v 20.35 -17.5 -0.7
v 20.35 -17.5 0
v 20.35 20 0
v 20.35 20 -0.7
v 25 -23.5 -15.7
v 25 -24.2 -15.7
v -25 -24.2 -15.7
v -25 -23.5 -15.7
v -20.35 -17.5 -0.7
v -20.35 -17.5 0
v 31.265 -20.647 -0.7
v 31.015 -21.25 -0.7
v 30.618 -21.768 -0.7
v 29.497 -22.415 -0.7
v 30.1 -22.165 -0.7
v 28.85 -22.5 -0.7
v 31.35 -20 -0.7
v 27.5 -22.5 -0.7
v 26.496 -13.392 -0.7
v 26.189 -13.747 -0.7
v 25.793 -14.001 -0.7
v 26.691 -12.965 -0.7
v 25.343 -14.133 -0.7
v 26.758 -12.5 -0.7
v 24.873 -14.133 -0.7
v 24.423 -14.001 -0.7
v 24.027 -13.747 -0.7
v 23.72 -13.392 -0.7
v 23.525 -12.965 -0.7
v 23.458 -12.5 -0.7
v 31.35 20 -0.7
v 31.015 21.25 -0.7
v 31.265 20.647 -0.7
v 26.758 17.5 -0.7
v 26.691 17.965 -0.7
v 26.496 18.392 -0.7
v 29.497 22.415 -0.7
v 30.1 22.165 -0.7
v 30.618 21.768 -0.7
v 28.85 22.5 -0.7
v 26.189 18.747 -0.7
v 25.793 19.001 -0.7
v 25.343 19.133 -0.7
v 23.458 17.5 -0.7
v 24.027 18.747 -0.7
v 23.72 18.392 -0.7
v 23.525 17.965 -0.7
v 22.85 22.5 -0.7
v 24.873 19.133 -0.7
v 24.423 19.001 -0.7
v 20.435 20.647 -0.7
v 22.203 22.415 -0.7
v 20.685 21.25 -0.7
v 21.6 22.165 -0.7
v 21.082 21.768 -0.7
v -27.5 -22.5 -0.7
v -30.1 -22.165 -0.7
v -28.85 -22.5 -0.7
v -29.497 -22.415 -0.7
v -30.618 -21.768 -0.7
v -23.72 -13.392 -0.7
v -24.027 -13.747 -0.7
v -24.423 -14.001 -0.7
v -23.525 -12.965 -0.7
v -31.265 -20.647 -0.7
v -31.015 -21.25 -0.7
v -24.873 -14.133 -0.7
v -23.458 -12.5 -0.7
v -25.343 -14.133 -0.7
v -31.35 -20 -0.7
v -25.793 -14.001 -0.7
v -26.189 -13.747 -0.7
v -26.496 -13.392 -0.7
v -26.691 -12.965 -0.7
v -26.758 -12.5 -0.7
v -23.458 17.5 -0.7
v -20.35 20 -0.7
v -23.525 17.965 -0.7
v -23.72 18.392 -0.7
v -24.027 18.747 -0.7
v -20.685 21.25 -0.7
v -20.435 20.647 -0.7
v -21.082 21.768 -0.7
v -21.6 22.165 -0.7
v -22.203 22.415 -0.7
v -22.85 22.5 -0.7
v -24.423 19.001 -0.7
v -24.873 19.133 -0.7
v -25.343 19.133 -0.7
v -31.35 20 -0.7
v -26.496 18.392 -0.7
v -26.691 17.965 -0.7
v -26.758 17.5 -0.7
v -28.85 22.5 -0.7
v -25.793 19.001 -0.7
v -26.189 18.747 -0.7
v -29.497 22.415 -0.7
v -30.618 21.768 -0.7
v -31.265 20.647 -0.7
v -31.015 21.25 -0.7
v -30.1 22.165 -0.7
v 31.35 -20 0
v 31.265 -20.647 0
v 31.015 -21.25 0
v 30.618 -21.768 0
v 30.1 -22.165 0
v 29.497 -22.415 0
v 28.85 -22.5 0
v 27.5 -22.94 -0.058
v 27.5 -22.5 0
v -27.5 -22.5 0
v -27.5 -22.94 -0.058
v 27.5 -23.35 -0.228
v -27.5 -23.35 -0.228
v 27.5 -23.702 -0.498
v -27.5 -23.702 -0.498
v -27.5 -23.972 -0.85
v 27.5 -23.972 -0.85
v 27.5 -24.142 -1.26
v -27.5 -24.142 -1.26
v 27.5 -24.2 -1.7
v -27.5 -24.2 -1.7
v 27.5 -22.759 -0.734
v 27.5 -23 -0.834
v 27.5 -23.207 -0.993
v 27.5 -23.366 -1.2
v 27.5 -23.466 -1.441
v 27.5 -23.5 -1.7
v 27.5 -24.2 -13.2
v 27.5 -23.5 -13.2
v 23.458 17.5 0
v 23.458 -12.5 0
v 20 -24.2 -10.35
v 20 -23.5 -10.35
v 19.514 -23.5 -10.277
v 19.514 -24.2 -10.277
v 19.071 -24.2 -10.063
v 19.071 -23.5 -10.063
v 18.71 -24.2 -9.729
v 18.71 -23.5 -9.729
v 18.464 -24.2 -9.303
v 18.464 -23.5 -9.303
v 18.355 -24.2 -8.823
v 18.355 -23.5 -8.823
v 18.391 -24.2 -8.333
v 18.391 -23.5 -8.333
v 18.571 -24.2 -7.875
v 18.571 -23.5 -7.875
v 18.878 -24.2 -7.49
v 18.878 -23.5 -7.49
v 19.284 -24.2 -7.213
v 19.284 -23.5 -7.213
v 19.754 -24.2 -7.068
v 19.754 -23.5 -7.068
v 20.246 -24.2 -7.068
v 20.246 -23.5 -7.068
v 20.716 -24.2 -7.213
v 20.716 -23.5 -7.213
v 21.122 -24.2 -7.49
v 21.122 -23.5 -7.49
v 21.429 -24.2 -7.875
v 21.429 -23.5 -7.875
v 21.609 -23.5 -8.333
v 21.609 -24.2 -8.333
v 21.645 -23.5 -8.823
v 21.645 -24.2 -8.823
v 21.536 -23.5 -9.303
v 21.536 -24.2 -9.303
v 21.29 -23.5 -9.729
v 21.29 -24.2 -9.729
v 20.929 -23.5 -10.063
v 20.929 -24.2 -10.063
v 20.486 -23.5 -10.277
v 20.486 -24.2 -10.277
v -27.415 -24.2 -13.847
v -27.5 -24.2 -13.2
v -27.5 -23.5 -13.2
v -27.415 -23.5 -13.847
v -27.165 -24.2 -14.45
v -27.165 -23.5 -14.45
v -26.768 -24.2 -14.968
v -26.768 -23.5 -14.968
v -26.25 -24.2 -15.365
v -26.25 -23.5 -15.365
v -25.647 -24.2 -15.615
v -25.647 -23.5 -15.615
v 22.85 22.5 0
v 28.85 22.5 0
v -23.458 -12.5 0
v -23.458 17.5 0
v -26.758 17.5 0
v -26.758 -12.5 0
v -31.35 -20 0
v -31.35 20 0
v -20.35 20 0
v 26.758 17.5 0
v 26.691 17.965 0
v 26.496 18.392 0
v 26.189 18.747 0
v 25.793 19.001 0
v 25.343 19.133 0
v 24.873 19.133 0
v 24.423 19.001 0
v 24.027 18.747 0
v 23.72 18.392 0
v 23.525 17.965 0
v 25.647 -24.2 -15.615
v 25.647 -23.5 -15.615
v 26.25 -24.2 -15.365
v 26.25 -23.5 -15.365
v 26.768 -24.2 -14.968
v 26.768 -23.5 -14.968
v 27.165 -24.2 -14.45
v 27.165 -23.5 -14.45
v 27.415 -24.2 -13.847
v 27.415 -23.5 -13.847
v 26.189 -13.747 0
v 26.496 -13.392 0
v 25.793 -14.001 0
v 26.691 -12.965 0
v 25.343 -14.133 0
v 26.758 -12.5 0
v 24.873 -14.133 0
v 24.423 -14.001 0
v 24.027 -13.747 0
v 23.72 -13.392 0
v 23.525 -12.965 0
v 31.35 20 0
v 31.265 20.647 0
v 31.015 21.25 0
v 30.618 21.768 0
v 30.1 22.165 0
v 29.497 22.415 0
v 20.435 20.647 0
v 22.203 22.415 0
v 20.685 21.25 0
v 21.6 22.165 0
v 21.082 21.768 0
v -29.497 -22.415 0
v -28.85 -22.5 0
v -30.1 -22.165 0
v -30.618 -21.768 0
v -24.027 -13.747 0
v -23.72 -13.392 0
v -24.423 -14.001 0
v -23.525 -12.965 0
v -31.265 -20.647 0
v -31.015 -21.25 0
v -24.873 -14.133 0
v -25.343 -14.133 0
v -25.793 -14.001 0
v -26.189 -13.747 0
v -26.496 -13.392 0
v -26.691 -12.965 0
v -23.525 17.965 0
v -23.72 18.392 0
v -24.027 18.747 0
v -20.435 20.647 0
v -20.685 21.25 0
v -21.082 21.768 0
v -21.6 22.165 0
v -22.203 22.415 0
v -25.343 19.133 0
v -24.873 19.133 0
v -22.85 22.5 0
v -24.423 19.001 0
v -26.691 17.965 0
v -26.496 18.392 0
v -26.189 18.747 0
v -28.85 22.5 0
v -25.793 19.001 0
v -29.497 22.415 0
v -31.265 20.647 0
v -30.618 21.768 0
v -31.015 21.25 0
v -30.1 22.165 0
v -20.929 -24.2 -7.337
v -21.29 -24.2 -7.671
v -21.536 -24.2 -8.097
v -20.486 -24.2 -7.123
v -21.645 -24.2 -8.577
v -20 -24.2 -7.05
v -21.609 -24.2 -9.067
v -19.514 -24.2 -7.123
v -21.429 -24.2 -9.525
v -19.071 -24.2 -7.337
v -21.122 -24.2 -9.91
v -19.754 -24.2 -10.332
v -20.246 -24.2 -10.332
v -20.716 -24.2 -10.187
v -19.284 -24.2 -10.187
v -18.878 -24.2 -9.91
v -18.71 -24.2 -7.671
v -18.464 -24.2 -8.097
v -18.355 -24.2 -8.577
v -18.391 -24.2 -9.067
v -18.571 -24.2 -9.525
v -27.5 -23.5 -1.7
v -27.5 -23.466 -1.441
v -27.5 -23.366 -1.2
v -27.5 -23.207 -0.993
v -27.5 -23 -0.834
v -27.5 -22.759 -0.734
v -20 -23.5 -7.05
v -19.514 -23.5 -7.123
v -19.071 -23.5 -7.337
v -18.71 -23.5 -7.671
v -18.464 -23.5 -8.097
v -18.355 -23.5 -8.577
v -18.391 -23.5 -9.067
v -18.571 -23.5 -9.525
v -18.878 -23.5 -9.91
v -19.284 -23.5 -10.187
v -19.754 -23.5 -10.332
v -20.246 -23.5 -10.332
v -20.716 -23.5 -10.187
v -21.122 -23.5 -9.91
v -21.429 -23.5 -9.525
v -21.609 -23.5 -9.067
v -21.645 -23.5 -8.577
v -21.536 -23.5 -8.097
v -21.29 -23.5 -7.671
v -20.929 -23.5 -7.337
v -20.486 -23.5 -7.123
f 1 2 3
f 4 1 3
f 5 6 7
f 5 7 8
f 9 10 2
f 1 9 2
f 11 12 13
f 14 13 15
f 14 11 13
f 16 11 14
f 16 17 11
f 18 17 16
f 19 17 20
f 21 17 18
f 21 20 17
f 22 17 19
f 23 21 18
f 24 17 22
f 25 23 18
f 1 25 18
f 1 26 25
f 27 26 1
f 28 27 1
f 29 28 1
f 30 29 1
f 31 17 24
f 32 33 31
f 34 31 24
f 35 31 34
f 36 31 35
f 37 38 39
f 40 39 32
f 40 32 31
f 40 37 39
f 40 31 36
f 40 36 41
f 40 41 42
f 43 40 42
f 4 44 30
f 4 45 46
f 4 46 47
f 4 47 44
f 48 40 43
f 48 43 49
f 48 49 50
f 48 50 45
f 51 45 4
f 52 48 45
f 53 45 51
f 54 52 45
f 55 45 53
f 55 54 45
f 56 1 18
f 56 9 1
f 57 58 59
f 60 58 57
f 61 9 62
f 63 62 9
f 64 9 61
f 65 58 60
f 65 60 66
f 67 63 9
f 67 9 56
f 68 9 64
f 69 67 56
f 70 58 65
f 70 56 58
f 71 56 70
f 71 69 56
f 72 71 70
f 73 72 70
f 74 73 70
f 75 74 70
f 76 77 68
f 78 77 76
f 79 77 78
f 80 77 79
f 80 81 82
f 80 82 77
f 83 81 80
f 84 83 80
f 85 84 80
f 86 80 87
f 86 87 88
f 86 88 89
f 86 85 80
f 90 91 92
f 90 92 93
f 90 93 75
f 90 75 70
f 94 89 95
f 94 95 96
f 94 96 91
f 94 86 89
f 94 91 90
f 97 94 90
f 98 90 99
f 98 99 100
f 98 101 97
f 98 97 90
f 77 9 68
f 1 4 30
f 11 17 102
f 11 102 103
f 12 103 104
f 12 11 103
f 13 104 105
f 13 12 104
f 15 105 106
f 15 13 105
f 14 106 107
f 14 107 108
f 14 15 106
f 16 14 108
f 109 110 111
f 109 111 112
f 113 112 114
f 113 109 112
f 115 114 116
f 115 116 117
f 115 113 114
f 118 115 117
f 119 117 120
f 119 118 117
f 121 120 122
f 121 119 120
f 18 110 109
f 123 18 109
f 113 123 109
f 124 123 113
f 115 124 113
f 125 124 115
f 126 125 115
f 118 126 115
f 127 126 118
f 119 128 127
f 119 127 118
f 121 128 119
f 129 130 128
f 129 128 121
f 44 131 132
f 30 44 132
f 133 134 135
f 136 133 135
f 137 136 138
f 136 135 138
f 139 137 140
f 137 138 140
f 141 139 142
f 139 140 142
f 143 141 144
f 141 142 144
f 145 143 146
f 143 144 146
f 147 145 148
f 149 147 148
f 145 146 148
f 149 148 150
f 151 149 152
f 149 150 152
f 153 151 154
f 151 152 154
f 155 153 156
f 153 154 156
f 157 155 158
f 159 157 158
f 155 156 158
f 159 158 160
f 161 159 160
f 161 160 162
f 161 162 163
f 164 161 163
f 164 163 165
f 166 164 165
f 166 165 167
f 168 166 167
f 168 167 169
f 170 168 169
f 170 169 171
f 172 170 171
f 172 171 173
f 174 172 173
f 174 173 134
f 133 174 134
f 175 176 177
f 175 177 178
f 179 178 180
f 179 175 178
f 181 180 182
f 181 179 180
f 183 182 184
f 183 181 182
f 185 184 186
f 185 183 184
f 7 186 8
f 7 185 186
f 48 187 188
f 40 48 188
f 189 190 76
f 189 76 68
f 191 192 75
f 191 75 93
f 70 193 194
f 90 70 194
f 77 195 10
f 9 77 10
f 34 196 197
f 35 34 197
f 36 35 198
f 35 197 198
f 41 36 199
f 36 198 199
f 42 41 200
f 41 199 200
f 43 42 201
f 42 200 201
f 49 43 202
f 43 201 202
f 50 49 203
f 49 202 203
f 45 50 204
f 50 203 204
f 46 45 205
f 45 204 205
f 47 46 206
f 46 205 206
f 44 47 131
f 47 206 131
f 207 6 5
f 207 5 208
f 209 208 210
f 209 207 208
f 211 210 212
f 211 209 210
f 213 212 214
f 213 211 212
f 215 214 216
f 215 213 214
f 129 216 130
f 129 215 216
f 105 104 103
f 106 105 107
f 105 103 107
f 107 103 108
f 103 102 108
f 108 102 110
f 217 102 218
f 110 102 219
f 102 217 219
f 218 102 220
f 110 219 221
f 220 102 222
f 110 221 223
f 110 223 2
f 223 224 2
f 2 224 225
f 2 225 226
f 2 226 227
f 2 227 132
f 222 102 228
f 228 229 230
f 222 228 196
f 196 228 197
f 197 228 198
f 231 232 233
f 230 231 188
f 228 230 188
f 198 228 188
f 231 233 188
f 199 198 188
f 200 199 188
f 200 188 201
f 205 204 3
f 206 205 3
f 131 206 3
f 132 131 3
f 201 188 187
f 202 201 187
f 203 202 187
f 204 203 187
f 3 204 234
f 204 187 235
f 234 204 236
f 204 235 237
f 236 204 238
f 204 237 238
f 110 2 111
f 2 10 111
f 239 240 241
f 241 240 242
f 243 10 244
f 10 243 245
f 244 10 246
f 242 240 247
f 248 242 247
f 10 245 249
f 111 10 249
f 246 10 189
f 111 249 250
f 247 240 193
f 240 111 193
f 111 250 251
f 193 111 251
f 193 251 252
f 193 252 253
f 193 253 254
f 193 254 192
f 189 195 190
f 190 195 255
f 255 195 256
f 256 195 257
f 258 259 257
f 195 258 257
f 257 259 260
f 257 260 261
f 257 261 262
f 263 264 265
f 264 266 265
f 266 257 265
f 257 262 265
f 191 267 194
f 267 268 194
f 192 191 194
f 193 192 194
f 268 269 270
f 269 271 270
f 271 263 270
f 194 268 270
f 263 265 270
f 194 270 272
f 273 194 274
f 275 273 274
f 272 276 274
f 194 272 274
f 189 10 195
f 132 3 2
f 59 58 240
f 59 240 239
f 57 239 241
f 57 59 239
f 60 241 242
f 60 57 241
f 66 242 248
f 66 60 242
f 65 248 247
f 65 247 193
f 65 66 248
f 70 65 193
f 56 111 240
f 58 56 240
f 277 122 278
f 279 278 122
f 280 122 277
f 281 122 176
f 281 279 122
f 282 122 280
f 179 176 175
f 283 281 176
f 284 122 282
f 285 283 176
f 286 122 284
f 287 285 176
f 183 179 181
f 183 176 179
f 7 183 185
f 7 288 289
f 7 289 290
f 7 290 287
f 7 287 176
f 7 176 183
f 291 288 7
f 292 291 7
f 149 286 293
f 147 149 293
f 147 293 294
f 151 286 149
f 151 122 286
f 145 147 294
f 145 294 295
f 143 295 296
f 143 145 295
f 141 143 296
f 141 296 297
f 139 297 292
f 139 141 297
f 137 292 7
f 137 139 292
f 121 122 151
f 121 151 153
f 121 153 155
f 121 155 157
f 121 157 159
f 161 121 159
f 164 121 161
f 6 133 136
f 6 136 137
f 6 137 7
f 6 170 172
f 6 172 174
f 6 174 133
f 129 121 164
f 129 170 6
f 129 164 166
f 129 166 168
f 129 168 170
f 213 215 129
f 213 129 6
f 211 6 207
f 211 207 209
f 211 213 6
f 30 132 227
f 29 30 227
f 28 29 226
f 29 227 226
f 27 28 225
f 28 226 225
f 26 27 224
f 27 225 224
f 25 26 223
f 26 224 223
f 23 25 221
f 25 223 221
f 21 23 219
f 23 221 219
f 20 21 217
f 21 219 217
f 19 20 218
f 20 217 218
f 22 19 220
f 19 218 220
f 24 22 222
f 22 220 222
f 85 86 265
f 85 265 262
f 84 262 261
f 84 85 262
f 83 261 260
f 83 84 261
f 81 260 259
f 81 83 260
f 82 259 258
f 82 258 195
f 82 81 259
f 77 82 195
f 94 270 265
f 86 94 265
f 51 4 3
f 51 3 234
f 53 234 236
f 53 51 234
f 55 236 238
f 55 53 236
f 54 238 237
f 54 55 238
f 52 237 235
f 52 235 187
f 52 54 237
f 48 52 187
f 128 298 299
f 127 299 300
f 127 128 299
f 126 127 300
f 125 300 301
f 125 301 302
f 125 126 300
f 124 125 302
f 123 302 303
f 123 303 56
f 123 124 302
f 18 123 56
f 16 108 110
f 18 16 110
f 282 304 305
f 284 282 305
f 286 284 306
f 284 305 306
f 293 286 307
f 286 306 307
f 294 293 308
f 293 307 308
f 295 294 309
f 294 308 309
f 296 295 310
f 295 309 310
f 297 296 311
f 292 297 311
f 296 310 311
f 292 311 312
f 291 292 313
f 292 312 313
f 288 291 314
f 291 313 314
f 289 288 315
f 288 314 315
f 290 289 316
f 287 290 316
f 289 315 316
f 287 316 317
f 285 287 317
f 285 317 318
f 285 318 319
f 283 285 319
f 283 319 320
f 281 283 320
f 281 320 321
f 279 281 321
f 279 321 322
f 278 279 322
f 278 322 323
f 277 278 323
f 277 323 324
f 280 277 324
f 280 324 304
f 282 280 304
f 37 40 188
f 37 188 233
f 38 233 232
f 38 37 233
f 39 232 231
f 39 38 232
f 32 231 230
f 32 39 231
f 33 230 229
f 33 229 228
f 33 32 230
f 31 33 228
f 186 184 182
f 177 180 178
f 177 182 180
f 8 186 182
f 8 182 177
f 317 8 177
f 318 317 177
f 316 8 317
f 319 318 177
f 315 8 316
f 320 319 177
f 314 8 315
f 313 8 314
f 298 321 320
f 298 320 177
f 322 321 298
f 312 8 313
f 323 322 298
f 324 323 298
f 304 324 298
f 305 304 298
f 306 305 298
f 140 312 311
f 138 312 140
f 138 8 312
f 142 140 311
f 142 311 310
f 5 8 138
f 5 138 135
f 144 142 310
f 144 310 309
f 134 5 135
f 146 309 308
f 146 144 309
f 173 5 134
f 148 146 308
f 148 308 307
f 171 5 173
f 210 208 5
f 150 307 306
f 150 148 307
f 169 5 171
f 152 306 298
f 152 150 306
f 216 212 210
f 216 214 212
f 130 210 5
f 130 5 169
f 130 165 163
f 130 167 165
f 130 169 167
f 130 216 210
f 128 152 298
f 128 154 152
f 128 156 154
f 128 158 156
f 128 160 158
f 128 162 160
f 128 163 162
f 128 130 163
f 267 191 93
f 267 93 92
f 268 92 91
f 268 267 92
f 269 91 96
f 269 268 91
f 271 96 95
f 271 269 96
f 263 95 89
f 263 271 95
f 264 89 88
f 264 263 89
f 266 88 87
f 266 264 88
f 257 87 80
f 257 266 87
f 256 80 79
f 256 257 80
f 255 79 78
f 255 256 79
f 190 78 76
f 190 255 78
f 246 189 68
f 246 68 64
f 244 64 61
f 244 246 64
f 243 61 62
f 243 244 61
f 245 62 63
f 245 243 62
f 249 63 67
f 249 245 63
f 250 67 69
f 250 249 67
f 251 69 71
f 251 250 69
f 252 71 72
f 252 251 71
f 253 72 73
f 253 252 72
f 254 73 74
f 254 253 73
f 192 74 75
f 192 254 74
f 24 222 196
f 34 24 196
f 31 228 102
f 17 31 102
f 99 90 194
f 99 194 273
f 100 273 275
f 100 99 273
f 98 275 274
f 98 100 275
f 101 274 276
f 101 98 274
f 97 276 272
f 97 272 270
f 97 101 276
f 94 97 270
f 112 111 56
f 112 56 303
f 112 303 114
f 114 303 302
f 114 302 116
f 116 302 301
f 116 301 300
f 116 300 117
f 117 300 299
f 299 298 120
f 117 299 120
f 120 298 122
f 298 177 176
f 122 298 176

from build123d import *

# Parameters (mm, degrees)
BASE_FLANGE1_DEPTH    = 0.7
EDGE_FLANGE1_DEPTH    = 55
CUT_EXTRUDE1_DEPTH    = 10
CUT_EXTRUDE2_REACH    = 59.839
SKETCH9_R             = 1.65
BREAK_CORNER1_START   = -24.2
BREAK_CORNER1_DEPTH   = 0.7
BREAK_CORNER1_START_2 = -0.7
BREAK_CORNER1_2_DEPTH = 0.7


# Read off the part's stored shape, not the designer's step: Break-Corner1
# Sheet-metal steps are written as plain solids
with BuildPart() as part:
    # Sketch2 → Base-Flange1 (new body)
    with BuildSketch(Plane.XY):
        Polygon((20.35, 22.5), (31.35, 22.5), (31.35, -22.5), (-31.35, -22.5), (-31.35, 22.5), (-20.35, 22.5), (-20.35, -17.5), (20.35, -17.5), align=None)
    extrude(amount=-BASE_FLANGE1_DEPTH)

    # Edge-Flange1 section (across the edge) → Edge-Flange1 (add)
    with BuildSketch(Plane(origin=(27.5, -23.5, -0.7), x_dir=(0, 1, 0), z_dir=(-1, 0, 0))):
        with BuildLine():
            Line((-0.7, 1), (-0.7, 15))
            Line((-0.7, 15), (0, 15))
            Line((0, 15), (0, 1))
            ThreePointArc((0, 1), (0.292893219, 0.292893219), (1, 0))
            Line((1, 0), (1, -0.7))
            ThreePointArc((1, -0.7), (-0.202081528, -0.202081528), (-0.7, 1))
        make_face()
    extrude(amount=EDGE_FLANGE1_DEPTH)

    # Sketch8 → Cut-Extrude1 (cut)
    with BuildSketch(Plane.XY):
        with BuildLine():
            Line((-23.458, 17.5), (-23.458, -12.5))
            ThreePointArc((-23.458, -12.5), (-25.108, -14.15), (-26.758, -12.5))
            Line((-26.758, -12.5), (-26.758, 17.5))
            ThreePointArc((-26.758, 17.5), (-25.108, 19.15), (-23.458, 17.5))
        make_face()
        with BuildLine():
            Line((23.458, 17.5), (23.458, -12.5))
            ThreePointArc((23.458, -12.5), (25.108, -14.15), (26.758, -12.5))
            Line((26.758, -12.5), (26.758, 17.5))
            ThreePointArc((26.758, 17.5), (25.108, 19.15), (23.458, 17.5))
        make_face()
    extrude(amount=-CUT_EXTRUDE1_DEPTH, mode=Mode.SUBTRACT)

    # Sketch9 → Cut-Extrude2 (cut, up to next)
    with BuildSketch(Plane(origin=(0, -23.5, 0), x_dir=(1, 0, 0), z_dir=(0, 1, 0)), mode=Mode.PRIVATE) as cut_extrude2_sk1:
        with Locations(Location((-20, 8.7, 0), (0, 0, 270))):
            Circle(SKETCH9_R)
    cut_extrude2_tool1 = extrude(cut_extrude2_sk1.sketch, amount=-CUT_EXTRUDE2_REACH, mode=Mode.PRIVATE) & part.part
    # Sketch9 → Cut-Extrude2 (cut, up to next)
    with BuildSketch(Plane(origin=(0, -23.5, 0), x_dir=(1, 0, 0), z_dir=(0, 1, 0)), mode=Mode.PRIVATE) as cut_extrude2_sk2:
        with Locations(Location((20, 8.7, 0), (0, 0, 90))):
            Circle(SKETCH9_R)
    cut_extrude2_tool2 = extrude(cut_extrude2_sk2.sketch, amount=-CUT_EXTRUDE2_REACH, mode=Mode.PRIVATE) & part.part
    add(cut_extrude2_tool1.solids().sort_by_distance((-20, -23.5, -8.7))[0], mode=Mode.SUBTRACT)
    add(cut_extrude2_tool2.solids().sort_by_distance((20, -23.5, -8.7))[0], mode=Mode.SUBTRACT)

    # Break-Corner1 outline → Break-Corner1 (cut)
    with BuildSketch(Plane(origin=(0, 0, 0), x_dir=(1, 0, 0), z_dir=(0, 1, 0)).offset(BREAK_CORNER1_START)):
        with BuildLine():
            Line((27.5, 15.7), (25, 15.7))
            ThreePointArc((25, 15.7), (26.767766953, 14.967766953), (27.5, 13.2))
            Line((27.5, 13.2), (27.5, 15.7))
        make_face()
        with BuildLine():
            ThreePointArc((-27.5, 13.2), (-26.767766953, 14.967766953), (-25, 15.7))
            Line((-25, 15.7), (-27.5, 15.7))
            Line((-27.5, 15.7), (-27.5, 13.2))
        make_face()
    extrude(amount=BREAK_CORNER1_DEPTH, mode=Mode.SUBTRACT)

    # Break-Corner1 2 outline → Break-Corner1 2 (cut)
    with BuildSketch(Plane.XY.offset(BREAK_CORNER1_START_2)):
        with BuildLine():
            ThreePointArc((20.35, 20), (21.082233047, 21.767766953), (22.85, 22.5))
            Line((22.85, 22.5), (20.35, 22.5))
            Line((20.35, 22.5), (20.35, 20))
        make_face()
        with BuildLine():
            ThreePointArc((28.85, 22.5), (30.617766953, 21.767766953), (31.35, 20))
            Line((31.35, 20), (31.35, 22.5))
            Line((31.35, 22.5), (28.85, 22.5))
        make_face()
        with BuildLine():
            ThreePointArc((31.35, -20), (30.617766953, -21.767766953), (28.85, -22.5))
            Line((28.85, -22.5), (31.35, -22.5))
            Line((31.35, -22.5), (31.35, -20))
        make_face()
        with BuildLine():
            Line((-20.35, 22.5), (-22.85, 22.5))
            ThreePointArc((-22.85, 22.5), (-21.082233047, 21.767766953), (-20.35, 20))
            Line((-20.35, 20), (-20.35, 22.5))
        make_face()
        with BuildLine():
            Line((-31.35, 22.5), (-31.35, 20))
            ThreePointArc((-31.35, 20), (-30.617766953, 21.767766953), (-28.85, 22.5))
            Line((-28.85, 22.5), (-31.35, 22.5))
        make_face()
        with BuildLine():
            ThreePointArc((-28.85, -22.5), (-30.617766953, -21.767766953), (-31.35, -20))
            Line((-31.35, -20), (-31.35, -22.5))
            Line((-31.35, -22.5), (-28.85, -22.5))
        make_face()
    extrude(amount=BREAK_CORNER1_2_DEPTH, mode=Mode.SUBTRACT)


solid = part.part
